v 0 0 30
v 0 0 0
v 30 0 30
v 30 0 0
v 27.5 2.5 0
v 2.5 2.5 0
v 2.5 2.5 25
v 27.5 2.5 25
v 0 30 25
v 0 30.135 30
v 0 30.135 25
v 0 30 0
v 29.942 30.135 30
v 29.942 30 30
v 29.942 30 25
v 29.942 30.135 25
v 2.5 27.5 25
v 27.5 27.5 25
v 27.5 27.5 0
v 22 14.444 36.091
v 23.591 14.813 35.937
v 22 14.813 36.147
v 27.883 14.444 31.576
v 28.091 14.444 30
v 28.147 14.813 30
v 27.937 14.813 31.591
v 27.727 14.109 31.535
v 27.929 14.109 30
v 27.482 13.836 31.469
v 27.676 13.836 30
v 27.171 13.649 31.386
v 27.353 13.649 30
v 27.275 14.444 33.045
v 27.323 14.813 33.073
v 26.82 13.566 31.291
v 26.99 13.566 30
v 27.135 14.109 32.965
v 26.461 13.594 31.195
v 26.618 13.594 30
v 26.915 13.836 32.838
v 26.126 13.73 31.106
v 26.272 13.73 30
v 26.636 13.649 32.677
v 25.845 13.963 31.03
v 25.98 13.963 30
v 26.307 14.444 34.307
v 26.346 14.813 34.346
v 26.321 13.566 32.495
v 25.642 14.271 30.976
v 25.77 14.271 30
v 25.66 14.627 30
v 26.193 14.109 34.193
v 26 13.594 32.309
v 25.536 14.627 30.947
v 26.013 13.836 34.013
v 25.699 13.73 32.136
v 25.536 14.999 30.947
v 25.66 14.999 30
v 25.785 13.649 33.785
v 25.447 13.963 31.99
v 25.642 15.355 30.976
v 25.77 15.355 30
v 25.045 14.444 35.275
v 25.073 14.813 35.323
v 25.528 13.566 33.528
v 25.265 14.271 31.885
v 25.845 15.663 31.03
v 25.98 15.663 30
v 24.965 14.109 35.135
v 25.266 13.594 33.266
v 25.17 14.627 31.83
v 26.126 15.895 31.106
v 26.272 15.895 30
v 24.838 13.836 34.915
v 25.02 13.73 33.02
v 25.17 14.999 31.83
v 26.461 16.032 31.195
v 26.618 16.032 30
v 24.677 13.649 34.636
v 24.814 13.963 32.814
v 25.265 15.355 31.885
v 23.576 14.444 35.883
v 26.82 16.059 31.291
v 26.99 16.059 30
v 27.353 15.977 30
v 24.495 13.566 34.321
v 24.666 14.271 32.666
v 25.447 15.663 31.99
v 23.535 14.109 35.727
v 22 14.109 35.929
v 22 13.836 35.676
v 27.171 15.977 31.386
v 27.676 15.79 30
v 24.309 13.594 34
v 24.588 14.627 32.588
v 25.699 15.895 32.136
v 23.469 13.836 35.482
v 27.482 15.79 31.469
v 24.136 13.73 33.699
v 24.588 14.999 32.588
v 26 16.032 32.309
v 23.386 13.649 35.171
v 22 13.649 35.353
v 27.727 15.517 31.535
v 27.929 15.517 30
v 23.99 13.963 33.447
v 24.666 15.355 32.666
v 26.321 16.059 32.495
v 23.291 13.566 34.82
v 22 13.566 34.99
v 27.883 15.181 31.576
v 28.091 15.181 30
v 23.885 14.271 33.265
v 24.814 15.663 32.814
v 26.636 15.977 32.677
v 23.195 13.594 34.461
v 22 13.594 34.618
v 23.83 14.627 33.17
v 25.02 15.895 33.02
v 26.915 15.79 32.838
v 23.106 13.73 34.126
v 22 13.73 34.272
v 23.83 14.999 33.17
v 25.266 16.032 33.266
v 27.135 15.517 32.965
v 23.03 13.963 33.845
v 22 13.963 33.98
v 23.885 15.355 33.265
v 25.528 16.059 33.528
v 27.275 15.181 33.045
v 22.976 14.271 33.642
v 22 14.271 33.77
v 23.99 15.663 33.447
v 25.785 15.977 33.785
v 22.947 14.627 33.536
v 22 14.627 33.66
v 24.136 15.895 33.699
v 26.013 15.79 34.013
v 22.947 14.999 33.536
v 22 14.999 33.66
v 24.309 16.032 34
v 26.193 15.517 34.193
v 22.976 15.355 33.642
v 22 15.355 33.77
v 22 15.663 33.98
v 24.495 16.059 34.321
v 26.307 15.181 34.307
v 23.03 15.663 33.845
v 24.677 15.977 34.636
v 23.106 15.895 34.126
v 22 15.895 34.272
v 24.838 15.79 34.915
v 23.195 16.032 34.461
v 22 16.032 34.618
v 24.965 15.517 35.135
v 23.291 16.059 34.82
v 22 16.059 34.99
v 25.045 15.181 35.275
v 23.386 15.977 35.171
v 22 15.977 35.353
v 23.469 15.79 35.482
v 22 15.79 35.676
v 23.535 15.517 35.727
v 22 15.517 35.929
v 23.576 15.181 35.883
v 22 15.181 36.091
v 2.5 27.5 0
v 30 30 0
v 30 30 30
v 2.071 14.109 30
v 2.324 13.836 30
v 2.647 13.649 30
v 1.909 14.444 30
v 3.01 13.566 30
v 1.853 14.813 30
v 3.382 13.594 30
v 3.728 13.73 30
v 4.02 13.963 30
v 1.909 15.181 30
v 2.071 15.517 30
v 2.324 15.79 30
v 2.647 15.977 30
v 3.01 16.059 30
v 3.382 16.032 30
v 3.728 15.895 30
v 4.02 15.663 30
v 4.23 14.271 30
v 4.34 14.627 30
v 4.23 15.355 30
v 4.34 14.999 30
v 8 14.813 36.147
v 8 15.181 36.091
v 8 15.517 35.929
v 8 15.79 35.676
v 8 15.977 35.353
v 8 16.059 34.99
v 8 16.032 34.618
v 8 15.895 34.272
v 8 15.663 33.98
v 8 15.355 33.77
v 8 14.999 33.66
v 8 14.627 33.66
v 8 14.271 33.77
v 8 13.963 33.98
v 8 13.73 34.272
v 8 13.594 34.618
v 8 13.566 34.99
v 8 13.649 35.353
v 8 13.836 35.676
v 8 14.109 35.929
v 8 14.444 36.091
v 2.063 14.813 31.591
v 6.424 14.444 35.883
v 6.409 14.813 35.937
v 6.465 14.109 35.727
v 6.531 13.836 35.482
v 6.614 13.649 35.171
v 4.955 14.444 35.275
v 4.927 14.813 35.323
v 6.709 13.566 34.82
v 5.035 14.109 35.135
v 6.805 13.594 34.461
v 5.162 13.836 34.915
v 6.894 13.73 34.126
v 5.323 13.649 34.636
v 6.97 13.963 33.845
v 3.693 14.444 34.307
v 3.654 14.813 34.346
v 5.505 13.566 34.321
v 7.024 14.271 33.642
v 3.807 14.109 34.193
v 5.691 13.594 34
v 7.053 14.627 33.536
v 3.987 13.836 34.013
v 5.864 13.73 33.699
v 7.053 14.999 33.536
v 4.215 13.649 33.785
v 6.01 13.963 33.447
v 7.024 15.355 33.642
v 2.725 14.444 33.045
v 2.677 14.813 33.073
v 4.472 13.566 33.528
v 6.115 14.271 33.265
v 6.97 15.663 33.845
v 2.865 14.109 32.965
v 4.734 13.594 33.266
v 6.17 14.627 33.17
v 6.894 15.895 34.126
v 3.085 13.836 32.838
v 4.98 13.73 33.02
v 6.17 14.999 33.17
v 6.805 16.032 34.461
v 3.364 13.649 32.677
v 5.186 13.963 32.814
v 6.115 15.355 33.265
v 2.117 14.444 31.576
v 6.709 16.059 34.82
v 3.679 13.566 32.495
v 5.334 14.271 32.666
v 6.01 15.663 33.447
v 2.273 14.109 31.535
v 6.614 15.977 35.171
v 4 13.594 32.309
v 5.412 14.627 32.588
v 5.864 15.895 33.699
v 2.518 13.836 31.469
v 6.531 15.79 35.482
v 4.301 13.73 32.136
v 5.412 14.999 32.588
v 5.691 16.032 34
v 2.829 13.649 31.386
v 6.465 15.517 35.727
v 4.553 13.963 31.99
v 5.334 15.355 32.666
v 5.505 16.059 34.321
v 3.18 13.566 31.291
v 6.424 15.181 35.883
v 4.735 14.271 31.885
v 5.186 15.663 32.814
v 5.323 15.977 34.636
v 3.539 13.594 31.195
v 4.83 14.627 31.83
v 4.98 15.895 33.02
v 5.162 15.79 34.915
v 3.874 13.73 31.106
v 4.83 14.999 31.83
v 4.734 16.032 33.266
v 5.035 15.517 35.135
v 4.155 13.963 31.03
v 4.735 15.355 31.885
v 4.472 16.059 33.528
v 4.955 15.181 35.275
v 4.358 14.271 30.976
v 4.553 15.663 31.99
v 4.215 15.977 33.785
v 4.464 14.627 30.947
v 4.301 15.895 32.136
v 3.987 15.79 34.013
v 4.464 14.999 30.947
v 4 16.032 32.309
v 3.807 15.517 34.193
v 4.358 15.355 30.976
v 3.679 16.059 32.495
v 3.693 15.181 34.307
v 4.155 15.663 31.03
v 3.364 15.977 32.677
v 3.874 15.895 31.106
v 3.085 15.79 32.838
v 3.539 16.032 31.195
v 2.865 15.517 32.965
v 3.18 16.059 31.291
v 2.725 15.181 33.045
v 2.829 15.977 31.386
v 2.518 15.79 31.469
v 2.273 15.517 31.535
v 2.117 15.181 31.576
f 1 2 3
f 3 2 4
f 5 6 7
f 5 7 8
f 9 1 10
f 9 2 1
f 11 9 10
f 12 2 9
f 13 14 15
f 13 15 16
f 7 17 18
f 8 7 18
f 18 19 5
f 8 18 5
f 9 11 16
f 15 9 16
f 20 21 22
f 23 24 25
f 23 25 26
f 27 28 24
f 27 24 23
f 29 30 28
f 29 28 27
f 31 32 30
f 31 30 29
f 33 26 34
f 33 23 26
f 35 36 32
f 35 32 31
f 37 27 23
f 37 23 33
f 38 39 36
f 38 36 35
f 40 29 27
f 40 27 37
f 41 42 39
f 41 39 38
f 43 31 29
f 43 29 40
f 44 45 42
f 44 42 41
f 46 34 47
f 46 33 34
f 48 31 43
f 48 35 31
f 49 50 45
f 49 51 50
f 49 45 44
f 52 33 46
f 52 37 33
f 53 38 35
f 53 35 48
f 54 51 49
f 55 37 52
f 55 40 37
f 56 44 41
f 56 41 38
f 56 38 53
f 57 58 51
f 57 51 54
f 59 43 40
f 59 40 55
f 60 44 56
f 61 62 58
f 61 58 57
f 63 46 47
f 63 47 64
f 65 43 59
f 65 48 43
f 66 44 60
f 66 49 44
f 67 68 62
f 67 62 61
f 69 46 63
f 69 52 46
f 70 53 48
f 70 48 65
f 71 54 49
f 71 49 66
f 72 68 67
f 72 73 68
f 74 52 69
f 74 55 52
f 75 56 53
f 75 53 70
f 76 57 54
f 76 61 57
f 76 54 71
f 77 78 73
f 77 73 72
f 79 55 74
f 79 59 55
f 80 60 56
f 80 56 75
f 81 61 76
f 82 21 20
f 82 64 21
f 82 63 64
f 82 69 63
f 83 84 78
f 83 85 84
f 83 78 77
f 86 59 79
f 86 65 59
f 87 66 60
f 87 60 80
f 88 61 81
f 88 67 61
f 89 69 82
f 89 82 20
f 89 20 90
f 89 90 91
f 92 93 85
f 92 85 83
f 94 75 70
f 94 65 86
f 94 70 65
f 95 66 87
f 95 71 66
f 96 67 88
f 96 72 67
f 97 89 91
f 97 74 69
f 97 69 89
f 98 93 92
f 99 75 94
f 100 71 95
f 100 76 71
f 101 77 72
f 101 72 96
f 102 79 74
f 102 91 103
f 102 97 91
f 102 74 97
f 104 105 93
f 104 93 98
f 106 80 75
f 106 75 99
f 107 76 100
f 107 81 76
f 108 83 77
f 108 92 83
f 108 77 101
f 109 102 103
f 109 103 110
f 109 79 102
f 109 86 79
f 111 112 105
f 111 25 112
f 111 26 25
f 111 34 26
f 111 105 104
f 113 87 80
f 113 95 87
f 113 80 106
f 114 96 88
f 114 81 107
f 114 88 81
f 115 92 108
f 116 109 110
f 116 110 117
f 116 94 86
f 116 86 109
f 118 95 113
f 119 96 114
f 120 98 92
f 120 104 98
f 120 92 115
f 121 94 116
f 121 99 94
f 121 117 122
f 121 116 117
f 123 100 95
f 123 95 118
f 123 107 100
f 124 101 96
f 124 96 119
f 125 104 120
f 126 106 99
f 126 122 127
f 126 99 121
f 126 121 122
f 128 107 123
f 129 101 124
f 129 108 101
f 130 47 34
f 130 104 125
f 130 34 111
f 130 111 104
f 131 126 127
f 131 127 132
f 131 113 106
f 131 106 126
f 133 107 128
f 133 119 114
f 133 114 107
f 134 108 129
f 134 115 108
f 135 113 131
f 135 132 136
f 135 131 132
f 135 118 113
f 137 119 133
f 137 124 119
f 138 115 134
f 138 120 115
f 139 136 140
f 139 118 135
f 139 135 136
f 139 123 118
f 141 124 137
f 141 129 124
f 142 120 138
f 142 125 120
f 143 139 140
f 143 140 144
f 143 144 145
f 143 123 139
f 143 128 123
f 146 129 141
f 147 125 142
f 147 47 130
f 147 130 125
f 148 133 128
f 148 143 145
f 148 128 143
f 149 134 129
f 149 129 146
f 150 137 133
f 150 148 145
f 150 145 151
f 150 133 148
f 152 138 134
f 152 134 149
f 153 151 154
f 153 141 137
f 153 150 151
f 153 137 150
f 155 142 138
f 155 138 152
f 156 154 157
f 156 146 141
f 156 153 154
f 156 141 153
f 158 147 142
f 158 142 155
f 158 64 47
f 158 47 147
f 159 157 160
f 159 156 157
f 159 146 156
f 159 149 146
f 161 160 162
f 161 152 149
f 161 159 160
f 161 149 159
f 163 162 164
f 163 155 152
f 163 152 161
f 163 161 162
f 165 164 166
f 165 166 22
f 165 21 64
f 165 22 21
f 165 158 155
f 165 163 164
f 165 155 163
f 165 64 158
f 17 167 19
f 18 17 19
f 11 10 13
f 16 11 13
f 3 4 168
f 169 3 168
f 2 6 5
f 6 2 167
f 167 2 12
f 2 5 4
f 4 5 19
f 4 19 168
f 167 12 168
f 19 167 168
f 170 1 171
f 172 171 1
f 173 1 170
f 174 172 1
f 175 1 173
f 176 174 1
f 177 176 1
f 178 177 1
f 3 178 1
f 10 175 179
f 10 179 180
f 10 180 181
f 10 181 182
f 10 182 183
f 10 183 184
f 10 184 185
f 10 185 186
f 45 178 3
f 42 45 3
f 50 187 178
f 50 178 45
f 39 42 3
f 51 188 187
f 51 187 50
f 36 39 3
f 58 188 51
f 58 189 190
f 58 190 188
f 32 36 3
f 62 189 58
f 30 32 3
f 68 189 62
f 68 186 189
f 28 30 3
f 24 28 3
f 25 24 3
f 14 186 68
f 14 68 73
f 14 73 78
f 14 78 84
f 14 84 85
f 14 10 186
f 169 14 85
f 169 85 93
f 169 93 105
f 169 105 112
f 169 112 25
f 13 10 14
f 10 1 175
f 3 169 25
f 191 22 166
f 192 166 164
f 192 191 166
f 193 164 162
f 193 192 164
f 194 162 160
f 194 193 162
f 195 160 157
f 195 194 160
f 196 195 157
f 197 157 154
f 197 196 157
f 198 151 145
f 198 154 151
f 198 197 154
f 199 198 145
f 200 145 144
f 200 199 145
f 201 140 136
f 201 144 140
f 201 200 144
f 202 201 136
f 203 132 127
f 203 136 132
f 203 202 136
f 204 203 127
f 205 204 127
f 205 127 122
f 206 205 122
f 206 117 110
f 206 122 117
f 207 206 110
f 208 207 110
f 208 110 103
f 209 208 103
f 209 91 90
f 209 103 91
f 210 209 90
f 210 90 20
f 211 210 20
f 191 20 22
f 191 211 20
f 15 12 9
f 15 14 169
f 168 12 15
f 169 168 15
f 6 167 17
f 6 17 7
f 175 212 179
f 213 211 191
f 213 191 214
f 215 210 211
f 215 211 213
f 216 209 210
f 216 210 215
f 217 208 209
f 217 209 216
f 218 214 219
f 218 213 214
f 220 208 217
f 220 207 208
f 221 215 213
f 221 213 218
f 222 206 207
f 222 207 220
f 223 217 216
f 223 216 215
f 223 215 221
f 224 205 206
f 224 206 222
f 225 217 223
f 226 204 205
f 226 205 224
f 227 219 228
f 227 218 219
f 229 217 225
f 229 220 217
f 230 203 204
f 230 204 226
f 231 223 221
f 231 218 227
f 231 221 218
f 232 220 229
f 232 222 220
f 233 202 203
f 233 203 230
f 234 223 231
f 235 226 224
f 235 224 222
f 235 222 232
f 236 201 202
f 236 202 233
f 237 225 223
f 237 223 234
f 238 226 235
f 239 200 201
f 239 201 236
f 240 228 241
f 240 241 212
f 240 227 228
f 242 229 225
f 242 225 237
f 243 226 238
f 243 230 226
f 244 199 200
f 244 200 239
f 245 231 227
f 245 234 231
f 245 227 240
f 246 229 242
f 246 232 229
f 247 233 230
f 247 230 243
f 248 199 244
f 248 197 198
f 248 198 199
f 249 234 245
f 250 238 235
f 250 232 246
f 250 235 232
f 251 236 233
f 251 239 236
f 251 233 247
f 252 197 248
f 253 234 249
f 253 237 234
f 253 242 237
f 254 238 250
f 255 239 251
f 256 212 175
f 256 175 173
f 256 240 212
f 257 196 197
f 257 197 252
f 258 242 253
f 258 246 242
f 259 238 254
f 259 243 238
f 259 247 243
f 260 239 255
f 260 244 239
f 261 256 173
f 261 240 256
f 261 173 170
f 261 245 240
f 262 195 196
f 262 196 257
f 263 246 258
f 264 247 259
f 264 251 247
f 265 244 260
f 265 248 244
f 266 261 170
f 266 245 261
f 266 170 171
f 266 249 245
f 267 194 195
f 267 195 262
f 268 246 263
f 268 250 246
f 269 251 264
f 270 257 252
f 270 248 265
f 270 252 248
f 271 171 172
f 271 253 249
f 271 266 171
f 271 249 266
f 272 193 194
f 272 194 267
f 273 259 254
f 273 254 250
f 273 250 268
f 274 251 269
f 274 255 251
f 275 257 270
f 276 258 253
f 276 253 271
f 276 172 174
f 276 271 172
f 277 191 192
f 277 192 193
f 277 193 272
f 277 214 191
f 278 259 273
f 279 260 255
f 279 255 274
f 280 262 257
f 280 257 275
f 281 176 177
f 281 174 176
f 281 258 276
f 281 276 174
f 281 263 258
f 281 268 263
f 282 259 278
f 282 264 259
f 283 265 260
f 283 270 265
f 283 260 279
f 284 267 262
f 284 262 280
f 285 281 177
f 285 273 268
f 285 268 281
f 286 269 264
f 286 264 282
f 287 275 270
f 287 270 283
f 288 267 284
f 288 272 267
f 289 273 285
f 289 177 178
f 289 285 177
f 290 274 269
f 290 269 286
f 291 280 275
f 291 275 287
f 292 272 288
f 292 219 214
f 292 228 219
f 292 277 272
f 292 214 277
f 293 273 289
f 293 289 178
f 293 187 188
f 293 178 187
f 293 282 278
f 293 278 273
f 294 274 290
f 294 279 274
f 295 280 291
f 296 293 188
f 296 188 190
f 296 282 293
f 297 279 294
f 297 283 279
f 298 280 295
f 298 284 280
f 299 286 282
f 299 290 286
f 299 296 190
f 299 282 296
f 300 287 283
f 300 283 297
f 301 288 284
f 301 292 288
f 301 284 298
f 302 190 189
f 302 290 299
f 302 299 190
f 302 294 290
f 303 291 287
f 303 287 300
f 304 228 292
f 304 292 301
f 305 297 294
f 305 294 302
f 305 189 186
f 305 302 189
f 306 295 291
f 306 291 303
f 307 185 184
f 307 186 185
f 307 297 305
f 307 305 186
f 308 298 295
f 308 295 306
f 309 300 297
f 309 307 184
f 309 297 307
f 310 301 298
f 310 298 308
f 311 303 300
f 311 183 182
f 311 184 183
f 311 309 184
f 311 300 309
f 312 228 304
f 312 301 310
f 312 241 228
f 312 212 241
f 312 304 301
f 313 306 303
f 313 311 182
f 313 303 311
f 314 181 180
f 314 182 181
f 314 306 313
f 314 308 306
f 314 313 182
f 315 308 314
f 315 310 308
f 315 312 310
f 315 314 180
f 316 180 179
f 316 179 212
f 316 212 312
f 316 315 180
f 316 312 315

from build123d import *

# Parameters (mm, degrees)
F0_W      = 30
F0_H      = 30
F1_DEPTH  = 30
F5_R      = 1.25
F7_W      = 25
F7_H      = 25
F8_DEPTH  = 30
F9_W      = 29.9418475479
F9_H      = 30.1353819668
F10_DEPTH = 5


with BuildPart() as f1:
    # F0 (on Top) → F1 (new body)
    with BuildSketch(Plane.XY):
        with Locations((15, 15)):
            Rectangle(F0_W, F0_H)
    extrude(amount=F1_DEPTH)

    # F6: sweep along a path in F4
    with BuildLine(Plane(origin=(0, 15, 0), x_dir=(-1, 0, 0), z_dir=(0, 1, 0))) as f6_path:
        ThreePointArc((-27, 30), (-25.5355339059, 33.5355339059), (-22, 35))
        Line((-22, 35), (-8, 35))
        ThreePointArc((-8, 35), (-4.4644660941, 33.5355339059), (-3, 30))
    # F5 (on face) → F6 (sweep)
    with BuildSketch(Plane.XY.offset(30)):
        with Locations((26.8965084106, 14.8129407316)):
            Circle(F5_R)
    sweep(path=f6_path.line)

    # F7 (on face) → F8 (cut, through all)
    with BuildSketch(Plane(origin=(0, 0, 0), x_dir=(1, 0, 0), z_dir=(0, 0, -1))):
        with Locations((15, -15)):
            Rectangle(F7_W, F7_H)
    extrude(amount=-F8_DEPTH, mode=Mode.SUBTRACT)

    # F9 (on face) → F10 (join)
    with BuildSketch(Plane.XY.offset(30)):
        with Locations((14.9709237739, 15.0676909834)):
            Rectangle(F9_W, F9_H)
    extrude(amount=-F10_DEPTH)


solid = f1.part
